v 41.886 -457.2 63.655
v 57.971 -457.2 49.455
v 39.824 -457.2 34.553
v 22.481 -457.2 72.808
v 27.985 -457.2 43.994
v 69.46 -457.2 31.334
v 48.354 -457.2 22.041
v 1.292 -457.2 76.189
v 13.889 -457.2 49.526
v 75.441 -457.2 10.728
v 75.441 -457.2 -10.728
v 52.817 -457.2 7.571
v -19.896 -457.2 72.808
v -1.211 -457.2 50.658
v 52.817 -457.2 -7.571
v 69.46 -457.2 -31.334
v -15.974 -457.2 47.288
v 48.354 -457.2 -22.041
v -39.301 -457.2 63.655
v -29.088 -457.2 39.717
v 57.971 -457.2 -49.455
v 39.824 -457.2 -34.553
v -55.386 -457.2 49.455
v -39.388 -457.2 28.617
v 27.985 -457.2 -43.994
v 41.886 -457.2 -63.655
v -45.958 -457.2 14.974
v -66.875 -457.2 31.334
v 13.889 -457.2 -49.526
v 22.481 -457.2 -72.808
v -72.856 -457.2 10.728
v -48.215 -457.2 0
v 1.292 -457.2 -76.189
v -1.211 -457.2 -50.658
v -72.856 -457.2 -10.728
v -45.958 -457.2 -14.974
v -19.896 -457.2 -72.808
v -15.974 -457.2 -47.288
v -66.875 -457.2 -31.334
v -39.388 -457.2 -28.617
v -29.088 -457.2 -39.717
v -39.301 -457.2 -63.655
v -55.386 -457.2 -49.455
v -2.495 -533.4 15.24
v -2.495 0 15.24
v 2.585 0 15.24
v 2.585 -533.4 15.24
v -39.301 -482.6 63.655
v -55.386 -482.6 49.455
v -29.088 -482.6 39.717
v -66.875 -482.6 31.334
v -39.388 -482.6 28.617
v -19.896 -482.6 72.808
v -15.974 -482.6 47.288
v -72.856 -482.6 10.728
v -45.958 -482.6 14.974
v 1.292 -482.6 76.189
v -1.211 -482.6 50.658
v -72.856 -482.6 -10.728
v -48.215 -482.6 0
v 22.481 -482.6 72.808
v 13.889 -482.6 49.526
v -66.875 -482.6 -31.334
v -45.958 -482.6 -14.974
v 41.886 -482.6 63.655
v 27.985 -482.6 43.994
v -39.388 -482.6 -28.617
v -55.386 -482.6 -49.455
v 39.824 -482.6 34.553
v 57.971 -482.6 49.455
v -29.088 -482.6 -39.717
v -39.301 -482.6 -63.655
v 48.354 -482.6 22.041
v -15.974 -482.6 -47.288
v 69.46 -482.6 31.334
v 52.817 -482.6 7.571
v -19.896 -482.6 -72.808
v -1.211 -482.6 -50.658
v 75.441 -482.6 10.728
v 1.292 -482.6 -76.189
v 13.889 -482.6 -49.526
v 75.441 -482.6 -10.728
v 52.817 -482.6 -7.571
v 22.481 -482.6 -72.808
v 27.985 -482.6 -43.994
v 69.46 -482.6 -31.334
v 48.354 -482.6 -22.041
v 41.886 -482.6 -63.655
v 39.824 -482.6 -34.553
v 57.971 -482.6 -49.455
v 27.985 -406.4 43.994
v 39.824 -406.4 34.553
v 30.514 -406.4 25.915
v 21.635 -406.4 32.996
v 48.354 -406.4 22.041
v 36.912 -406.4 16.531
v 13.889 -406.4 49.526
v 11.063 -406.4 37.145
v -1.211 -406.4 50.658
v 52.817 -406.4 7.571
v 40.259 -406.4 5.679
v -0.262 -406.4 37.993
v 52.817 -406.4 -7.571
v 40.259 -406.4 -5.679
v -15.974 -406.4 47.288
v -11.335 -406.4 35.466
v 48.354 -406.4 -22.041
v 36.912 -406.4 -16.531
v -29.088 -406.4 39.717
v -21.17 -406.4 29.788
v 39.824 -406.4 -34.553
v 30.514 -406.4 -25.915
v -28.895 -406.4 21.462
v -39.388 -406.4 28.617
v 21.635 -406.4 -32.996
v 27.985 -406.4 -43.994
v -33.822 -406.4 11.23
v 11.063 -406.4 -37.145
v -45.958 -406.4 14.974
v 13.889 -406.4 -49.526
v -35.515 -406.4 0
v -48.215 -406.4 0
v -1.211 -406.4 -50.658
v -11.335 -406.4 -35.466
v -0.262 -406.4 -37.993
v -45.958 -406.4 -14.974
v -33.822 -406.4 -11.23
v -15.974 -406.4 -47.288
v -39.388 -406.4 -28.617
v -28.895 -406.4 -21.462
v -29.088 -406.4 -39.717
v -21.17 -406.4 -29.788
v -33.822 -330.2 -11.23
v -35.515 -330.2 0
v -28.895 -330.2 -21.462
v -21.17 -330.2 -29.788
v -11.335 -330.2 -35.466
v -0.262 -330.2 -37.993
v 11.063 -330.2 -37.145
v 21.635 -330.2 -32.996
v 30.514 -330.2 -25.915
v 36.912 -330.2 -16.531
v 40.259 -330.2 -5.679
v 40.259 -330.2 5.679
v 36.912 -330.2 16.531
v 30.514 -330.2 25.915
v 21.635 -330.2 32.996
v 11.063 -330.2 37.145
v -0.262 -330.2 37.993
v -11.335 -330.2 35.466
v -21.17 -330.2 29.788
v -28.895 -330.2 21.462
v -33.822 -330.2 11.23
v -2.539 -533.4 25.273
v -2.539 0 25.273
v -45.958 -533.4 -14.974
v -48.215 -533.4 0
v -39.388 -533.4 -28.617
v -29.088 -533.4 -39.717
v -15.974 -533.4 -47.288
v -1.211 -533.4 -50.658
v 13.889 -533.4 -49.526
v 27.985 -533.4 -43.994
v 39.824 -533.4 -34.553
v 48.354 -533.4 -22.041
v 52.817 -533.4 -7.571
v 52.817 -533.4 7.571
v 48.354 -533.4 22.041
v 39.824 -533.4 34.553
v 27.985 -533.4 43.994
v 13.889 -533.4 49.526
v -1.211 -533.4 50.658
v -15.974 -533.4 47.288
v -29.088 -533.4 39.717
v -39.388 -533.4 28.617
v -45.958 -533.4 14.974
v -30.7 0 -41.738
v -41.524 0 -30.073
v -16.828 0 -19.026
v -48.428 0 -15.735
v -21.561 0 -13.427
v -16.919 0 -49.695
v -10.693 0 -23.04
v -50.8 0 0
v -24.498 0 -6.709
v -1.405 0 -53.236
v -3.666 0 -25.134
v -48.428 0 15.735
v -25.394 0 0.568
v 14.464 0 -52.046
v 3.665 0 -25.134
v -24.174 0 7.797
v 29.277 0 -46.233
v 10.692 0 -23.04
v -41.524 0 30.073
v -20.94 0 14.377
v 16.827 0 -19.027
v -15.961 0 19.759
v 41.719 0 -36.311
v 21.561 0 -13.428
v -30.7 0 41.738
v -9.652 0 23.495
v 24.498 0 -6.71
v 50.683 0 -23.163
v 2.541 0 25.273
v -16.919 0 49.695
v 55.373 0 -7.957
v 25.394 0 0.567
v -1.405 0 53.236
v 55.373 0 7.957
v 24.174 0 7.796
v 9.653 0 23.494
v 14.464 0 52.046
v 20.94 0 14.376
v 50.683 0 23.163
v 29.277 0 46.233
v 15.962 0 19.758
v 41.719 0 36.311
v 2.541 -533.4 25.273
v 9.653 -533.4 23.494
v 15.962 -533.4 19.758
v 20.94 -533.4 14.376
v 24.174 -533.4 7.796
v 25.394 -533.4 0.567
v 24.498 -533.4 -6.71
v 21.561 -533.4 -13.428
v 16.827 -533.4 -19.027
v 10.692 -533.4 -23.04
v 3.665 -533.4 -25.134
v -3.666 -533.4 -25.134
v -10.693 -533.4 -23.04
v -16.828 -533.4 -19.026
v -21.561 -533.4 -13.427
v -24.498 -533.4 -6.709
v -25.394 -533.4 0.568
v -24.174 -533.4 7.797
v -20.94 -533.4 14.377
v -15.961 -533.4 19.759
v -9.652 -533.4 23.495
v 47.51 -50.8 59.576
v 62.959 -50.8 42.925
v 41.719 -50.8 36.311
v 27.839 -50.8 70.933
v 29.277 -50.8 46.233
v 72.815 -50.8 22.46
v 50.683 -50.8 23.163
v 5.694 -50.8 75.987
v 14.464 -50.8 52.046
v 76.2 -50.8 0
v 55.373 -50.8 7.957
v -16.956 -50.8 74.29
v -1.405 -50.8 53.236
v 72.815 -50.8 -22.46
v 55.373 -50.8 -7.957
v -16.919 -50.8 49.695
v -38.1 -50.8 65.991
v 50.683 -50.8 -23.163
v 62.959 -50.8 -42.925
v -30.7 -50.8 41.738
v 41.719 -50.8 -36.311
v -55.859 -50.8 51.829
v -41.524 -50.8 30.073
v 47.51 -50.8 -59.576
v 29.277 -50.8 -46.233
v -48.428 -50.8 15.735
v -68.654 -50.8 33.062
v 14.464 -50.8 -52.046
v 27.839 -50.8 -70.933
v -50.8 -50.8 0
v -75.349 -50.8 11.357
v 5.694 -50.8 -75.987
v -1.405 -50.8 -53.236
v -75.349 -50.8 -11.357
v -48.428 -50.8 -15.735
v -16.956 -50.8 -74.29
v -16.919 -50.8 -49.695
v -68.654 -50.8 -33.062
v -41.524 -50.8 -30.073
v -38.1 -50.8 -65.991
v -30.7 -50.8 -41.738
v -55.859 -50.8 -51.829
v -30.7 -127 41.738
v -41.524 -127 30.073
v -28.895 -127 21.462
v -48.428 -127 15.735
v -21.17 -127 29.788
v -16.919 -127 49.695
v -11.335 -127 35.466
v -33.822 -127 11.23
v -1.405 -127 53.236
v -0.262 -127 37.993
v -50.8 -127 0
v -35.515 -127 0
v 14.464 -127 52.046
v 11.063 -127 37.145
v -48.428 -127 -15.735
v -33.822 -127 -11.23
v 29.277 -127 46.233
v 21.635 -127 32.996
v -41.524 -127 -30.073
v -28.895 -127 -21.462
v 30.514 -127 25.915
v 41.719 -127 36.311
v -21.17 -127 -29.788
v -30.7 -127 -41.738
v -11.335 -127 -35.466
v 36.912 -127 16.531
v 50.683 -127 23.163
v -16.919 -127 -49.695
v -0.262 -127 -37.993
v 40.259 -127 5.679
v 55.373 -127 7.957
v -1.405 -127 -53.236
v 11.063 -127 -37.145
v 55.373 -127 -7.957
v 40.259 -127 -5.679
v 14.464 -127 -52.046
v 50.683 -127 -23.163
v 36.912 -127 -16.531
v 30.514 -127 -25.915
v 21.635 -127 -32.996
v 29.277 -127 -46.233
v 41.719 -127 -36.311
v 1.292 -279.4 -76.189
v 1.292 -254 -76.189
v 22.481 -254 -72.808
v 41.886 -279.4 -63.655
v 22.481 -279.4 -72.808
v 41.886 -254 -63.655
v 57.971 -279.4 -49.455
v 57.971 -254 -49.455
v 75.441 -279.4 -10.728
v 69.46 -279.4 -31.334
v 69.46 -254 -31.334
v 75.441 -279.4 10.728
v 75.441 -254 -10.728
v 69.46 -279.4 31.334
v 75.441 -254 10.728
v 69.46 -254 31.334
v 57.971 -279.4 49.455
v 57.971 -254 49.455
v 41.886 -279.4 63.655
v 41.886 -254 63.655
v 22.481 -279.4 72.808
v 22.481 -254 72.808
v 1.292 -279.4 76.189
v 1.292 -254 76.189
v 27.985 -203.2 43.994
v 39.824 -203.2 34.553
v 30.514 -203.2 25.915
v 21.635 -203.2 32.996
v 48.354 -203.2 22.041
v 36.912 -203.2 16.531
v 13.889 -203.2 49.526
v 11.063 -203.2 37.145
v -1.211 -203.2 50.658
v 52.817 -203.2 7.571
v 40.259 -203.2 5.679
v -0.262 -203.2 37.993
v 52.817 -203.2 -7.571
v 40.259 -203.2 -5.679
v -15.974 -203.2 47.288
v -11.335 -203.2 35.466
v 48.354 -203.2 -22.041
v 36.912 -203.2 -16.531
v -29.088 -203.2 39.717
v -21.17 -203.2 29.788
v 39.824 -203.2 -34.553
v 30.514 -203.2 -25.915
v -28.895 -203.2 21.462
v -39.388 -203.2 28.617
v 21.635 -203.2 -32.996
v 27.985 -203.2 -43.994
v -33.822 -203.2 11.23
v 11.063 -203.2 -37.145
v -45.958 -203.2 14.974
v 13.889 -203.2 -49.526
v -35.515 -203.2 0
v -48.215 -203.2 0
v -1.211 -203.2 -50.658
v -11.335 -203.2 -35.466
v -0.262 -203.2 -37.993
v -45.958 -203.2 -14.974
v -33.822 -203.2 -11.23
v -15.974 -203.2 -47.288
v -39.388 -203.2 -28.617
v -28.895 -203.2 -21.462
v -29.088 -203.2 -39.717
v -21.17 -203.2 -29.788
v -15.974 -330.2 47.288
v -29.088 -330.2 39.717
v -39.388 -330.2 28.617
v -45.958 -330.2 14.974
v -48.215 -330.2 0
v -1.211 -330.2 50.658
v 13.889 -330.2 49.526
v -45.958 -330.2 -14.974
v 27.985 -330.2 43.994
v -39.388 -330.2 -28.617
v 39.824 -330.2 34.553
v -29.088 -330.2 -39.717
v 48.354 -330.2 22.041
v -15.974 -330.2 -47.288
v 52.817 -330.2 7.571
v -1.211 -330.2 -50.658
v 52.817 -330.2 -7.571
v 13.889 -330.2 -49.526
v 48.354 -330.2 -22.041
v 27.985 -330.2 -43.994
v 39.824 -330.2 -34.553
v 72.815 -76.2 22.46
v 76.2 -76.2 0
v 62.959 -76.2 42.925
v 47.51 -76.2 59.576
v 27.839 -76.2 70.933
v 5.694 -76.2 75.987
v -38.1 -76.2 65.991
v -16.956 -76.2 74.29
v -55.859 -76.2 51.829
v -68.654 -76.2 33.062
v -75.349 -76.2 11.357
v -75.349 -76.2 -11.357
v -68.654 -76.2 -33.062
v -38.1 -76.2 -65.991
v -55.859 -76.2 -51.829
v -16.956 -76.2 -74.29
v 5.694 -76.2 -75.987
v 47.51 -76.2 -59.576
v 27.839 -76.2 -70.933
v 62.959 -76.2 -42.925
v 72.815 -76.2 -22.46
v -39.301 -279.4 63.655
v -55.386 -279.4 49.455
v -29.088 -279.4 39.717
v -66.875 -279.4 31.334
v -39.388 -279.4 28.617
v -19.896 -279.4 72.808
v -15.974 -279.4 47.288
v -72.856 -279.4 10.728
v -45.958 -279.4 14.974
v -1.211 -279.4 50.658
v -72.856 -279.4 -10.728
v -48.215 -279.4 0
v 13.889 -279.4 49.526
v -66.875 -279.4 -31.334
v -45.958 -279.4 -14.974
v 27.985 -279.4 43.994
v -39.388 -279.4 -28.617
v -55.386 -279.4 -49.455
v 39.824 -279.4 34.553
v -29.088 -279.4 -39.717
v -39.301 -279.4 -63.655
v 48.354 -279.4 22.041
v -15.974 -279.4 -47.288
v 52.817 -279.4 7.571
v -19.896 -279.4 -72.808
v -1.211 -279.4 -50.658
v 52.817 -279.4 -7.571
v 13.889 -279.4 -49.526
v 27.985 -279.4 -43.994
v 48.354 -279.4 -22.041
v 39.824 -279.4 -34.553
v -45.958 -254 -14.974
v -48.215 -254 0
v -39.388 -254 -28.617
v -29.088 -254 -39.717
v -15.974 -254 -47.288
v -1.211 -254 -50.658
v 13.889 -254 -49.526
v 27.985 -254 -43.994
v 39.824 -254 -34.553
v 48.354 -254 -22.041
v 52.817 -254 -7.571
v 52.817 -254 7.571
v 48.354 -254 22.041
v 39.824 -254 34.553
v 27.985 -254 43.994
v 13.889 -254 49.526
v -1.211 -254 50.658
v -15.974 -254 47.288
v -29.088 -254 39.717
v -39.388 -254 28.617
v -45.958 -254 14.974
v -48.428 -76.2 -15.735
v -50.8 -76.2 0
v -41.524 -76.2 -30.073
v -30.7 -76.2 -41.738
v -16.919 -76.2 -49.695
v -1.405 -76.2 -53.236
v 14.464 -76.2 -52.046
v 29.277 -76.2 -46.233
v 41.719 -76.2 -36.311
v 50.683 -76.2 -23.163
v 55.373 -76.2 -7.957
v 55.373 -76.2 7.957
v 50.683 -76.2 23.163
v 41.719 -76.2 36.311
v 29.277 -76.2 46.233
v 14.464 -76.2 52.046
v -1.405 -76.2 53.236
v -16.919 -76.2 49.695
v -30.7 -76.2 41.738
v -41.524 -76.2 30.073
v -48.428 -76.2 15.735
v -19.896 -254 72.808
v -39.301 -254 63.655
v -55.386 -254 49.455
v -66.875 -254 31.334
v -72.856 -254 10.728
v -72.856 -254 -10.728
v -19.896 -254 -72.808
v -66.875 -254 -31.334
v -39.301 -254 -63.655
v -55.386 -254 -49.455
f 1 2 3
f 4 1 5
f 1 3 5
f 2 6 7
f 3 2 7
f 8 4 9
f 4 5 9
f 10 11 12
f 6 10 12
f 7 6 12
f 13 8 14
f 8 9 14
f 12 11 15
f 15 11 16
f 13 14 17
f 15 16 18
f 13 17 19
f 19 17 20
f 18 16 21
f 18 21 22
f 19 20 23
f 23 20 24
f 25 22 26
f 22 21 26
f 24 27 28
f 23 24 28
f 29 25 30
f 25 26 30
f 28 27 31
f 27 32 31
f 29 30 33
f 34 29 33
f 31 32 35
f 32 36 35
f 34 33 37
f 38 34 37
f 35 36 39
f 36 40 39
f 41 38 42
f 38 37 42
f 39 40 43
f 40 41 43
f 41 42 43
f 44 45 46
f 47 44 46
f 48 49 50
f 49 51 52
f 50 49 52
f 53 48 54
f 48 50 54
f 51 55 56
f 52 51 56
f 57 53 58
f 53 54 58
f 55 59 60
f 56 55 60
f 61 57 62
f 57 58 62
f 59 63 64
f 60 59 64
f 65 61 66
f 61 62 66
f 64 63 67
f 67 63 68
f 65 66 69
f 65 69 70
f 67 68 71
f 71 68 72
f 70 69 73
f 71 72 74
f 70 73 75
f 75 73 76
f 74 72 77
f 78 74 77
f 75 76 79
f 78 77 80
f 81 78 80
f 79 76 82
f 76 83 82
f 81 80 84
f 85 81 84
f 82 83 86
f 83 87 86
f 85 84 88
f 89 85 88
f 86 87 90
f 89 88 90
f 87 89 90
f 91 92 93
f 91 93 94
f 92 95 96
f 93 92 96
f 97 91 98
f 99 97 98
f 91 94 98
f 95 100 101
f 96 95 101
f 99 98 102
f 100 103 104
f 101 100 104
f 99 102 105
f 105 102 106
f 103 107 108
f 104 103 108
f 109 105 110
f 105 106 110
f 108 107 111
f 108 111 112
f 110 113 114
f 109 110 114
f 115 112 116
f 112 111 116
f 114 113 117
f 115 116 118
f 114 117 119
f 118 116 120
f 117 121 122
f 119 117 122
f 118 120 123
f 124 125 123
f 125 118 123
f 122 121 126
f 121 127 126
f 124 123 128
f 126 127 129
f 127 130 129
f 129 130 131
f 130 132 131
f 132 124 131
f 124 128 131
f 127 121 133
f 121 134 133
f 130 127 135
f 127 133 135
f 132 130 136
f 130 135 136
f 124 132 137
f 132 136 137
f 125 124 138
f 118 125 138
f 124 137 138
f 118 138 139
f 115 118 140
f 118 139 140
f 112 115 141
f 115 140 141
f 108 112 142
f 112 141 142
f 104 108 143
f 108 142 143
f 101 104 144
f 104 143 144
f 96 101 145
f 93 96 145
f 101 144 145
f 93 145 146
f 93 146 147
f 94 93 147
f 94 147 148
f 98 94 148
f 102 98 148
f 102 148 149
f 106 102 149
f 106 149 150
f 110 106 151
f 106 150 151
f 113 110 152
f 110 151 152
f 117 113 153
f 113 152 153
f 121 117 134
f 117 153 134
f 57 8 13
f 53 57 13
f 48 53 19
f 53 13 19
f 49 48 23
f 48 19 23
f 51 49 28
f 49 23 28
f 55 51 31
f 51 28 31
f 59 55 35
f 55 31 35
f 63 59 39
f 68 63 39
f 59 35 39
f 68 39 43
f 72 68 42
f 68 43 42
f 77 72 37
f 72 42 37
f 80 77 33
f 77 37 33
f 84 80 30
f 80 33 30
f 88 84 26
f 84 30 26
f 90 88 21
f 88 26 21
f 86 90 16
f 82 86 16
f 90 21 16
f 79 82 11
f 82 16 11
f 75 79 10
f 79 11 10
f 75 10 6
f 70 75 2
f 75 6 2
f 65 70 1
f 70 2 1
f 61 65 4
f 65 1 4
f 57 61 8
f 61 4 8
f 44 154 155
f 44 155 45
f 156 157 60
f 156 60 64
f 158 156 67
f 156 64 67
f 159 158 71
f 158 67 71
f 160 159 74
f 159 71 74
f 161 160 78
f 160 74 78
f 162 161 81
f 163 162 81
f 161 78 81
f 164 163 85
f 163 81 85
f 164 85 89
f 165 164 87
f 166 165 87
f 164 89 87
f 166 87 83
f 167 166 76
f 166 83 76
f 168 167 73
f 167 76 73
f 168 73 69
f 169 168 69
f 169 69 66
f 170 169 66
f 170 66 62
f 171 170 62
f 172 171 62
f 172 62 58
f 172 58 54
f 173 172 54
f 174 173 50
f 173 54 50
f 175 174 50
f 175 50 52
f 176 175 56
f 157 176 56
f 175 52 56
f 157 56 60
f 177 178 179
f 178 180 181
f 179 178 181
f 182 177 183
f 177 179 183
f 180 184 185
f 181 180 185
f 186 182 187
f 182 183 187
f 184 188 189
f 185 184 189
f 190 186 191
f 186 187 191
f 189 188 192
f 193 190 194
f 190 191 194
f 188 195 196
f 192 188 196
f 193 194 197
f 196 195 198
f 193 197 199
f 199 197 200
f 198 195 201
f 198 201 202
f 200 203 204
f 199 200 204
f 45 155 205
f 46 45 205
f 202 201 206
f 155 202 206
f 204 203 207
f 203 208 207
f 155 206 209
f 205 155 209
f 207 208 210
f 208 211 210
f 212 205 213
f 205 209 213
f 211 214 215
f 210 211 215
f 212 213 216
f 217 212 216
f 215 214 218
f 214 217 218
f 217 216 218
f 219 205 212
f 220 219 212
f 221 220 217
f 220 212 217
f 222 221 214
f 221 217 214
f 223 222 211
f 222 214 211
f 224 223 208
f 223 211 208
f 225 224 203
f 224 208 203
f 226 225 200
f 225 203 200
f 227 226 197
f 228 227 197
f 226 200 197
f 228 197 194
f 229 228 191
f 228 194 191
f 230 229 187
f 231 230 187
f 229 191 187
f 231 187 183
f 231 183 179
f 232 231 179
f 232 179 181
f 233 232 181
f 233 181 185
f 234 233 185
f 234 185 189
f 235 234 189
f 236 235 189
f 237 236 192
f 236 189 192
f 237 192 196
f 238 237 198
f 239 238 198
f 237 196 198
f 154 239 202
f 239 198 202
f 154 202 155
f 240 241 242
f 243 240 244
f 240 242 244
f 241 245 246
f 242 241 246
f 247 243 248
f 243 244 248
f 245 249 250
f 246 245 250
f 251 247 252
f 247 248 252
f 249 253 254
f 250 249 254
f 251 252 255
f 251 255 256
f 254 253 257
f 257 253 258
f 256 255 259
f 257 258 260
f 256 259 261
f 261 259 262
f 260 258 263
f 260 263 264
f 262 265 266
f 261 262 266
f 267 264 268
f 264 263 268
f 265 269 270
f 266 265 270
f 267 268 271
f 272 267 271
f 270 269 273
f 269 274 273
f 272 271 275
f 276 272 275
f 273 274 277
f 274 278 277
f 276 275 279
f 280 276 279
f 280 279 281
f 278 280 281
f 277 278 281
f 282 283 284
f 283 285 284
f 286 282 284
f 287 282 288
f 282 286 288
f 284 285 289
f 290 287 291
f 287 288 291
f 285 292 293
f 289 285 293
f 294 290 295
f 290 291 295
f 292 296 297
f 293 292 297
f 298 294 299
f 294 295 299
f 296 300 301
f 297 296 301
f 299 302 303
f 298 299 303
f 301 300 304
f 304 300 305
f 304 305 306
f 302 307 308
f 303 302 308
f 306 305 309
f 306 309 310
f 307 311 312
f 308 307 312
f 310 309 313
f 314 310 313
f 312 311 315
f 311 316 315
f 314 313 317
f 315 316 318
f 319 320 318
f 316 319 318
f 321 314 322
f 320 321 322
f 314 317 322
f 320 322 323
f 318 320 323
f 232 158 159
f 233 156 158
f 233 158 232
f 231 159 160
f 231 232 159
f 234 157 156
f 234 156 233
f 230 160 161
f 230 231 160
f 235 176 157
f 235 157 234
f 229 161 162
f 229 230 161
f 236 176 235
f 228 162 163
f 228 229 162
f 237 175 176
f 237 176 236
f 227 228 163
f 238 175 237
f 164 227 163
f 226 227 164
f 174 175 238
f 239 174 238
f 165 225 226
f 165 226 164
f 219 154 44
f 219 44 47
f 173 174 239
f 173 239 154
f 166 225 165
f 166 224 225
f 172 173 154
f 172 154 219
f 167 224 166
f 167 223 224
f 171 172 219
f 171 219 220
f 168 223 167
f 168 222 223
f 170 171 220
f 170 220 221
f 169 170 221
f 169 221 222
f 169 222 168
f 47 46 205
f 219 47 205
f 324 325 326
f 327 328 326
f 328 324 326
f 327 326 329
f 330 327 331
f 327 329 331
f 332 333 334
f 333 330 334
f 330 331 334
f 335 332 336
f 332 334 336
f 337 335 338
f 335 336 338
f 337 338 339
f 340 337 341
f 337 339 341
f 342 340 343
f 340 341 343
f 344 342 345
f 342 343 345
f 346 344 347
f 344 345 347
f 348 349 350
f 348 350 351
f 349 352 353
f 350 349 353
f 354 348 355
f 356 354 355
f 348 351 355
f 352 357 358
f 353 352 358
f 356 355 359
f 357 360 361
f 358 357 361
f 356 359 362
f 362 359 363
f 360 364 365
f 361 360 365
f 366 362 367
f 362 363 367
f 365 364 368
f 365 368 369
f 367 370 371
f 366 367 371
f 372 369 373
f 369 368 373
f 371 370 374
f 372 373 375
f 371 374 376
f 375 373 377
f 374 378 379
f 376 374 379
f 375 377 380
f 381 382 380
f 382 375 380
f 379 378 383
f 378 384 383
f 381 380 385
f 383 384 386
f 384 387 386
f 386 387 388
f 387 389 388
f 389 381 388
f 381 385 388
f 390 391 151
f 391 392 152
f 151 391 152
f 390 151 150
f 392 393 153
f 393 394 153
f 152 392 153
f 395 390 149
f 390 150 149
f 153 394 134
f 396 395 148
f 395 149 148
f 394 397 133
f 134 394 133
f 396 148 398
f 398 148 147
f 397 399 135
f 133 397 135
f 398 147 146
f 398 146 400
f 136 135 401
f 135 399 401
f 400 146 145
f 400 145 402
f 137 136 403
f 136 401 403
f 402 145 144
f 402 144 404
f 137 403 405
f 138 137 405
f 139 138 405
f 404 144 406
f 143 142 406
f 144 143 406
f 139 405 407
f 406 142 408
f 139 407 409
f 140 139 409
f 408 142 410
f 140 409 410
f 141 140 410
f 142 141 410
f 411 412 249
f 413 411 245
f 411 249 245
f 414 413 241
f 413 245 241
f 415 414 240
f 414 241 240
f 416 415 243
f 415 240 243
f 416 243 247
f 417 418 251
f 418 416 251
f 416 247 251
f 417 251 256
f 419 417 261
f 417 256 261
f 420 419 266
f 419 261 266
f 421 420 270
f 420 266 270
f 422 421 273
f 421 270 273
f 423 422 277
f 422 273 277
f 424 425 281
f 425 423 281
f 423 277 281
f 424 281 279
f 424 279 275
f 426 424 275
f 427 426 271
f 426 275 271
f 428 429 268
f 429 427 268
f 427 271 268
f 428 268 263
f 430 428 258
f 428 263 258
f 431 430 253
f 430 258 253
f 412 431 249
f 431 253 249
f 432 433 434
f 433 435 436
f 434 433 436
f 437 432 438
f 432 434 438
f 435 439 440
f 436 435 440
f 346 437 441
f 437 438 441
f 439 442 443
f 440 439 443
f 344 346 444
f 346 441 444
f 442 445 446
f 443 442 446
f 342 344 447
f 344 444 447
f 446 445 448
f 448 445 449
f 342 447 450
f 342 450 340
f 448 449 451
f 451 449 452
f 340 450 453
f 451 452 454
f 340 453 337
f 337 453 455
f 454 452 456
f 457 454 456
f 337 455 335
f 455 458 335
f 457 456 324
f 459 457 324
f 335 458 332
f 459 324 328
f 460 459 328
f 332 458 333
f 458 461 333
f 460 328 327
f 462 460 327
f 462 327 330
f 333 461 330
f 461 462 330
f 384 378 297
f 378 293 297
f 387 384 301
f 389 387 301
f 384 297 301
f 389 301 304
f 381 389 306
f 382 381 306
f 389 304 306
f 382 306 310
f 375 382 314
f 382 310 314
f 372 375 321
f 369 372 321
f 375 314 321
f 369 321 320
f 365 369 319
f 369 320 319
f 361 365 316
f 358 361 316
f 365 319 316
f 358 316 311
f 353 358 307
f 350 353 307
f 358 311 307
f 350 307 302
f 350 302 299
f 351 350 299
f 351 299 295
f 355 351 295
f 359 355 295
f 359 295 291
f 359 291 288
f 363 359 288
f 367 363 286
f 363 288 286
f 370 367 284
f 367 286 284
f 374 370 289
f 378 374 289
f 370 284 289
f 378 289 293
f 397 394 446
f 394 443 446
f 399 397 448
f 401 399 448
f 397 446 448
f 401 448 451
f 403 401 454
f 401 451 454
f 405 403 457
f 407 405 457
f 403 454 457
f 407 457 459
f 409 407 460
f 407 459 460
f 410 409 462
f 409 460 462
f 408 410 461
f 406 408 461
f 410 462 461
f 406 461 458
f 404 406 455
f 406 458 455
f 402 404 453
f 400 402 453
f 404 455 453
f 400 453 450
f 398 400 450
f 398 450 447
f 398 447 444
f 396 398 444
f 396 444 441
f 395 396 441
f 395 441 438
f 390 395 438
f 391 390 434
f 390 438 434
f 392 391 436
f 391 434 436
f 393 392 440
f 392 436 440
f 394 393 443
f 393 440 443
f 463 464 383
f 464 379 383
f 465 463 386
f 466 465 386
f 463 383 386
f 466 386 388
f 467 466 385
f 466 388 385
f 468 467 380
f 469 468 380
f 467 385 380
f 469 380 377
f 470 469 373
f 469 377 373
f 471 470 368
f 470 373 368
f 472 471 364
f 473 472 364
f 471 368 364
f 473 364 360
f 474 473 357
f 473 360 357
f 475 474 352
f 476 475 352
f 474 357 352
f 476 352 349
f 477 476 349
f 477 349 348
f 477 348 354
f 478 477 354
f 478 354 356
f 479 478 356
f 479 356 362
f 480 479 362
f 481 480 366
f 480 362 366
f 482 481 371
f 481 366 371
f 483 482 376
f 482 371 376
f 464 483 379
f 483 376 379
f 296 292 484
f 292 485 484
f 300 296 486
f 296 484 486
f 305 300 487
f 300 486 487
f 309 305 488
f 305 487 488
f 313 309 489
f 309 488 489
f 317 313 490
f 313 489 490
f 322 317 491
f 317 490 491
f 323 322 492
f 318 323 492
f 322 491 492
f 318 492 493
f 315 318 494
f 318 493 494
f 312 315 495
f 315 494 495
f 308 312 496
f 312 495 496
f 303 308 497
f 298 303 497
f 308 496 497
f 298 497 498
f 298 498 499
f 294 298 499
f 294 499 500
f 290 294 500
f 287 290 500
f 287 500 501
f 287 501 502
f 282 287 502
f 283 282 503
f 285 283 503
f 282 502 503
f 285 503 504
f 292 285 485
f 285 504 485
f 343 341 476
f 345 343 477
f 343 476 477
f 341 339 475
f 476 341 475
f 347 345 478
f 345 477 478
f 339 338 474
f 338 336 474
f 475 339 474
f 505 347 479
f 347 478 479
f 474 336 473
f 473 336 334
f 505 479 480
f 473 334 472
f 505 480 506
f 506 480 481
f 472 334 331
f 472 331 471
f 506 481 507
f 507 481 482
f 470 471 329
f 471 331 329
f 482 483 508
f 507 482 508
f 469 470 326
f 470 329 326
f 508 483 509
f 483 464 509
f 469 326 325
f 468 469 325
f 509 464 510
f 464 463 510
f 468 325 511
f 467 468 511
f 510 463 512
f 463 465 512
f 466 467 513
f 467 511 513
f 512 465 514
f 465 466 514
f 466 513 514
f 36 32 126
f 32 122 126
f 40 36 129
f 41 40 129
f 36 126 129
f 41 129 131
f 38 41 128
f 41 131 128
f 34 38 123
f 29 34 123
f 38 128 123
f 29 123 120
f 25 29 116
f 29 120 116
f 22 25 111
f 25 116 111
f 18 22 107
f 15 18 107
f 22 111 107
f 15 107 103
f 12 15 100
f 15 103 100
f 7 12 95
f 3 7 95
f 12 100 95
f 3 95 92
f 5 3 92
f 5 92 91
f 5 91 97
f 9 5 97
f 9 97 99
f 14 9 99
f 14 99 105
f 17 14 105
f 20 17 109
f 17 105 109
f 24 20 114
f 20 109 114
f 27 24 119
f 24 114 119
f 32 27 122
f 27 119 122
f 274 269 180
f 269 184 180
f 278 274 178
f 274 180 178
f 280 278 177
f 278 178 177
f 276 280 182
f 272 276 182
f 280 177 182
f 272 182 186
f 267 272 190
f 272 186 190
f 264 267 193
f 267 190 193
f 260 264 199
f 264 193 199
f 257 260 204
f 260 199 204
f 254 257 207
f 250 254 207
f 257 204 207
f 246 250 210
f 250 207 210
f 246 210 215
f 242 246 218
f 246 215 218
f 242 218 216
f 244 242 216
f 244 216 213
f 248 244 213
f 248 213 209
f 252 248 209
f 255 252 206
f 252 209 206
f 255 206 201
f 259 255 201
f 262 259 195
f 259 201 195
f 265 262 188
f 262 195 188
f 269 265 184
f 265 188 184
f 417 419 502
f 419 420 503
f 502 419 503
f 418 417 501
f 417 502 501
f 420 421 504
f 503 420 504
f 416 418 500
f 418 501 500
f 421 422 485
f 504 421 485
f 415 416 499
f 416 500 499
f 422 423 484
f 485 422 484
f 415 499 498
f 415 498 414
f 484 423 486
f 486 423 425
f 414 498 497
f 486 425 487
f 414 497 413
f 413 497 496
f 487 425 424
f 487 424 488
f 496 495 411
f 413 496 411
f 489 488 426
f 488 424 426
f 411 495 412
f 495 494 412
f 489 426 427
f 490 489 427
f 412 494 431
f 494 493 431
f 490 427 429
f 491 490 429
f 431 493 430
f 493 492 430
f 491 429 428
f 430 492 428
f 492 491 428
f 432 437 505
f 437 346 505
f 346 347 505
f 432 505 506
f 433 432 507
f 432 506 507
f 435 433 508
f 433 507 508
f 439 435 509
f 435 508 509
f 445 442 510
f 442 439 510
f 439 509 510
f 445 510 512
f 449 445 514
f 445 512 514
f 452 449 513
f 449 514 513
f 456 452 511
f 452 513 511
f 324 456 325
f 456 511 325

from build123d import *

# Parameters (mm, degrees)
F0_R     = 76.2
F1_DEPTH = 533.4


with BuildPart() as f1:
    # F0 (on Front) → F1 (new body)
    with BuildSketch(Plane.XZ):
        Circle(F0_R)
        with BuildLine():
            ThreePointArc((2.540587, 25.272622), (-0.000565, -25.4), (-2.539463, 25.272735))
            Line((-2.539463, 25.272735), (-2.495172, 15.24))
            Line((-2.495172, 15.24), (2.584878, 15.24))
            Line((2.584878, 15.24), (2.540587, 25.272622))
        make_face(mode=Mode.SUBTRACT)
    extrude(amount=F1_DEPTH)

    # F2 (on Top) → F3 (revolve, cut)
    with BuildSketch(Plane.XY):
        Polygon((-50.8, -50.8), (-50.8, 0), (-89.3064, 0), (-89.3064, -127), (-89.3064, -203.2), (-89.3064, -330.2), (-86.315122, -406.4), (-86.315122, -533.4), (-48.215122, -533.4), (-48.215122, -482.6), (-73.615122, -482.6), (-73.615122, -457.2), (-48.215122, -457.2), (-48.215122, -406.4), (-35.515122, -406.4), (-35.515122, -330.2), (-48.215122, -330.2), (-48.215122, -279.4), (-73.615122, -279.4), (-73.615122, -254), (-48.215122, -254), (-48.215122, -203.2), (-35.515122, -203.2), (-35.515122, -127), (-50.8, -127), (-50.8, -76.2), (-76.2, -76.2), (-76.2, -50.8), align=None)
    revolve(axis=Axis((2.584878, -165.1, 0), (0, -1, 0)), mode=Mode.SUBTRACT)


solid = f1.part
